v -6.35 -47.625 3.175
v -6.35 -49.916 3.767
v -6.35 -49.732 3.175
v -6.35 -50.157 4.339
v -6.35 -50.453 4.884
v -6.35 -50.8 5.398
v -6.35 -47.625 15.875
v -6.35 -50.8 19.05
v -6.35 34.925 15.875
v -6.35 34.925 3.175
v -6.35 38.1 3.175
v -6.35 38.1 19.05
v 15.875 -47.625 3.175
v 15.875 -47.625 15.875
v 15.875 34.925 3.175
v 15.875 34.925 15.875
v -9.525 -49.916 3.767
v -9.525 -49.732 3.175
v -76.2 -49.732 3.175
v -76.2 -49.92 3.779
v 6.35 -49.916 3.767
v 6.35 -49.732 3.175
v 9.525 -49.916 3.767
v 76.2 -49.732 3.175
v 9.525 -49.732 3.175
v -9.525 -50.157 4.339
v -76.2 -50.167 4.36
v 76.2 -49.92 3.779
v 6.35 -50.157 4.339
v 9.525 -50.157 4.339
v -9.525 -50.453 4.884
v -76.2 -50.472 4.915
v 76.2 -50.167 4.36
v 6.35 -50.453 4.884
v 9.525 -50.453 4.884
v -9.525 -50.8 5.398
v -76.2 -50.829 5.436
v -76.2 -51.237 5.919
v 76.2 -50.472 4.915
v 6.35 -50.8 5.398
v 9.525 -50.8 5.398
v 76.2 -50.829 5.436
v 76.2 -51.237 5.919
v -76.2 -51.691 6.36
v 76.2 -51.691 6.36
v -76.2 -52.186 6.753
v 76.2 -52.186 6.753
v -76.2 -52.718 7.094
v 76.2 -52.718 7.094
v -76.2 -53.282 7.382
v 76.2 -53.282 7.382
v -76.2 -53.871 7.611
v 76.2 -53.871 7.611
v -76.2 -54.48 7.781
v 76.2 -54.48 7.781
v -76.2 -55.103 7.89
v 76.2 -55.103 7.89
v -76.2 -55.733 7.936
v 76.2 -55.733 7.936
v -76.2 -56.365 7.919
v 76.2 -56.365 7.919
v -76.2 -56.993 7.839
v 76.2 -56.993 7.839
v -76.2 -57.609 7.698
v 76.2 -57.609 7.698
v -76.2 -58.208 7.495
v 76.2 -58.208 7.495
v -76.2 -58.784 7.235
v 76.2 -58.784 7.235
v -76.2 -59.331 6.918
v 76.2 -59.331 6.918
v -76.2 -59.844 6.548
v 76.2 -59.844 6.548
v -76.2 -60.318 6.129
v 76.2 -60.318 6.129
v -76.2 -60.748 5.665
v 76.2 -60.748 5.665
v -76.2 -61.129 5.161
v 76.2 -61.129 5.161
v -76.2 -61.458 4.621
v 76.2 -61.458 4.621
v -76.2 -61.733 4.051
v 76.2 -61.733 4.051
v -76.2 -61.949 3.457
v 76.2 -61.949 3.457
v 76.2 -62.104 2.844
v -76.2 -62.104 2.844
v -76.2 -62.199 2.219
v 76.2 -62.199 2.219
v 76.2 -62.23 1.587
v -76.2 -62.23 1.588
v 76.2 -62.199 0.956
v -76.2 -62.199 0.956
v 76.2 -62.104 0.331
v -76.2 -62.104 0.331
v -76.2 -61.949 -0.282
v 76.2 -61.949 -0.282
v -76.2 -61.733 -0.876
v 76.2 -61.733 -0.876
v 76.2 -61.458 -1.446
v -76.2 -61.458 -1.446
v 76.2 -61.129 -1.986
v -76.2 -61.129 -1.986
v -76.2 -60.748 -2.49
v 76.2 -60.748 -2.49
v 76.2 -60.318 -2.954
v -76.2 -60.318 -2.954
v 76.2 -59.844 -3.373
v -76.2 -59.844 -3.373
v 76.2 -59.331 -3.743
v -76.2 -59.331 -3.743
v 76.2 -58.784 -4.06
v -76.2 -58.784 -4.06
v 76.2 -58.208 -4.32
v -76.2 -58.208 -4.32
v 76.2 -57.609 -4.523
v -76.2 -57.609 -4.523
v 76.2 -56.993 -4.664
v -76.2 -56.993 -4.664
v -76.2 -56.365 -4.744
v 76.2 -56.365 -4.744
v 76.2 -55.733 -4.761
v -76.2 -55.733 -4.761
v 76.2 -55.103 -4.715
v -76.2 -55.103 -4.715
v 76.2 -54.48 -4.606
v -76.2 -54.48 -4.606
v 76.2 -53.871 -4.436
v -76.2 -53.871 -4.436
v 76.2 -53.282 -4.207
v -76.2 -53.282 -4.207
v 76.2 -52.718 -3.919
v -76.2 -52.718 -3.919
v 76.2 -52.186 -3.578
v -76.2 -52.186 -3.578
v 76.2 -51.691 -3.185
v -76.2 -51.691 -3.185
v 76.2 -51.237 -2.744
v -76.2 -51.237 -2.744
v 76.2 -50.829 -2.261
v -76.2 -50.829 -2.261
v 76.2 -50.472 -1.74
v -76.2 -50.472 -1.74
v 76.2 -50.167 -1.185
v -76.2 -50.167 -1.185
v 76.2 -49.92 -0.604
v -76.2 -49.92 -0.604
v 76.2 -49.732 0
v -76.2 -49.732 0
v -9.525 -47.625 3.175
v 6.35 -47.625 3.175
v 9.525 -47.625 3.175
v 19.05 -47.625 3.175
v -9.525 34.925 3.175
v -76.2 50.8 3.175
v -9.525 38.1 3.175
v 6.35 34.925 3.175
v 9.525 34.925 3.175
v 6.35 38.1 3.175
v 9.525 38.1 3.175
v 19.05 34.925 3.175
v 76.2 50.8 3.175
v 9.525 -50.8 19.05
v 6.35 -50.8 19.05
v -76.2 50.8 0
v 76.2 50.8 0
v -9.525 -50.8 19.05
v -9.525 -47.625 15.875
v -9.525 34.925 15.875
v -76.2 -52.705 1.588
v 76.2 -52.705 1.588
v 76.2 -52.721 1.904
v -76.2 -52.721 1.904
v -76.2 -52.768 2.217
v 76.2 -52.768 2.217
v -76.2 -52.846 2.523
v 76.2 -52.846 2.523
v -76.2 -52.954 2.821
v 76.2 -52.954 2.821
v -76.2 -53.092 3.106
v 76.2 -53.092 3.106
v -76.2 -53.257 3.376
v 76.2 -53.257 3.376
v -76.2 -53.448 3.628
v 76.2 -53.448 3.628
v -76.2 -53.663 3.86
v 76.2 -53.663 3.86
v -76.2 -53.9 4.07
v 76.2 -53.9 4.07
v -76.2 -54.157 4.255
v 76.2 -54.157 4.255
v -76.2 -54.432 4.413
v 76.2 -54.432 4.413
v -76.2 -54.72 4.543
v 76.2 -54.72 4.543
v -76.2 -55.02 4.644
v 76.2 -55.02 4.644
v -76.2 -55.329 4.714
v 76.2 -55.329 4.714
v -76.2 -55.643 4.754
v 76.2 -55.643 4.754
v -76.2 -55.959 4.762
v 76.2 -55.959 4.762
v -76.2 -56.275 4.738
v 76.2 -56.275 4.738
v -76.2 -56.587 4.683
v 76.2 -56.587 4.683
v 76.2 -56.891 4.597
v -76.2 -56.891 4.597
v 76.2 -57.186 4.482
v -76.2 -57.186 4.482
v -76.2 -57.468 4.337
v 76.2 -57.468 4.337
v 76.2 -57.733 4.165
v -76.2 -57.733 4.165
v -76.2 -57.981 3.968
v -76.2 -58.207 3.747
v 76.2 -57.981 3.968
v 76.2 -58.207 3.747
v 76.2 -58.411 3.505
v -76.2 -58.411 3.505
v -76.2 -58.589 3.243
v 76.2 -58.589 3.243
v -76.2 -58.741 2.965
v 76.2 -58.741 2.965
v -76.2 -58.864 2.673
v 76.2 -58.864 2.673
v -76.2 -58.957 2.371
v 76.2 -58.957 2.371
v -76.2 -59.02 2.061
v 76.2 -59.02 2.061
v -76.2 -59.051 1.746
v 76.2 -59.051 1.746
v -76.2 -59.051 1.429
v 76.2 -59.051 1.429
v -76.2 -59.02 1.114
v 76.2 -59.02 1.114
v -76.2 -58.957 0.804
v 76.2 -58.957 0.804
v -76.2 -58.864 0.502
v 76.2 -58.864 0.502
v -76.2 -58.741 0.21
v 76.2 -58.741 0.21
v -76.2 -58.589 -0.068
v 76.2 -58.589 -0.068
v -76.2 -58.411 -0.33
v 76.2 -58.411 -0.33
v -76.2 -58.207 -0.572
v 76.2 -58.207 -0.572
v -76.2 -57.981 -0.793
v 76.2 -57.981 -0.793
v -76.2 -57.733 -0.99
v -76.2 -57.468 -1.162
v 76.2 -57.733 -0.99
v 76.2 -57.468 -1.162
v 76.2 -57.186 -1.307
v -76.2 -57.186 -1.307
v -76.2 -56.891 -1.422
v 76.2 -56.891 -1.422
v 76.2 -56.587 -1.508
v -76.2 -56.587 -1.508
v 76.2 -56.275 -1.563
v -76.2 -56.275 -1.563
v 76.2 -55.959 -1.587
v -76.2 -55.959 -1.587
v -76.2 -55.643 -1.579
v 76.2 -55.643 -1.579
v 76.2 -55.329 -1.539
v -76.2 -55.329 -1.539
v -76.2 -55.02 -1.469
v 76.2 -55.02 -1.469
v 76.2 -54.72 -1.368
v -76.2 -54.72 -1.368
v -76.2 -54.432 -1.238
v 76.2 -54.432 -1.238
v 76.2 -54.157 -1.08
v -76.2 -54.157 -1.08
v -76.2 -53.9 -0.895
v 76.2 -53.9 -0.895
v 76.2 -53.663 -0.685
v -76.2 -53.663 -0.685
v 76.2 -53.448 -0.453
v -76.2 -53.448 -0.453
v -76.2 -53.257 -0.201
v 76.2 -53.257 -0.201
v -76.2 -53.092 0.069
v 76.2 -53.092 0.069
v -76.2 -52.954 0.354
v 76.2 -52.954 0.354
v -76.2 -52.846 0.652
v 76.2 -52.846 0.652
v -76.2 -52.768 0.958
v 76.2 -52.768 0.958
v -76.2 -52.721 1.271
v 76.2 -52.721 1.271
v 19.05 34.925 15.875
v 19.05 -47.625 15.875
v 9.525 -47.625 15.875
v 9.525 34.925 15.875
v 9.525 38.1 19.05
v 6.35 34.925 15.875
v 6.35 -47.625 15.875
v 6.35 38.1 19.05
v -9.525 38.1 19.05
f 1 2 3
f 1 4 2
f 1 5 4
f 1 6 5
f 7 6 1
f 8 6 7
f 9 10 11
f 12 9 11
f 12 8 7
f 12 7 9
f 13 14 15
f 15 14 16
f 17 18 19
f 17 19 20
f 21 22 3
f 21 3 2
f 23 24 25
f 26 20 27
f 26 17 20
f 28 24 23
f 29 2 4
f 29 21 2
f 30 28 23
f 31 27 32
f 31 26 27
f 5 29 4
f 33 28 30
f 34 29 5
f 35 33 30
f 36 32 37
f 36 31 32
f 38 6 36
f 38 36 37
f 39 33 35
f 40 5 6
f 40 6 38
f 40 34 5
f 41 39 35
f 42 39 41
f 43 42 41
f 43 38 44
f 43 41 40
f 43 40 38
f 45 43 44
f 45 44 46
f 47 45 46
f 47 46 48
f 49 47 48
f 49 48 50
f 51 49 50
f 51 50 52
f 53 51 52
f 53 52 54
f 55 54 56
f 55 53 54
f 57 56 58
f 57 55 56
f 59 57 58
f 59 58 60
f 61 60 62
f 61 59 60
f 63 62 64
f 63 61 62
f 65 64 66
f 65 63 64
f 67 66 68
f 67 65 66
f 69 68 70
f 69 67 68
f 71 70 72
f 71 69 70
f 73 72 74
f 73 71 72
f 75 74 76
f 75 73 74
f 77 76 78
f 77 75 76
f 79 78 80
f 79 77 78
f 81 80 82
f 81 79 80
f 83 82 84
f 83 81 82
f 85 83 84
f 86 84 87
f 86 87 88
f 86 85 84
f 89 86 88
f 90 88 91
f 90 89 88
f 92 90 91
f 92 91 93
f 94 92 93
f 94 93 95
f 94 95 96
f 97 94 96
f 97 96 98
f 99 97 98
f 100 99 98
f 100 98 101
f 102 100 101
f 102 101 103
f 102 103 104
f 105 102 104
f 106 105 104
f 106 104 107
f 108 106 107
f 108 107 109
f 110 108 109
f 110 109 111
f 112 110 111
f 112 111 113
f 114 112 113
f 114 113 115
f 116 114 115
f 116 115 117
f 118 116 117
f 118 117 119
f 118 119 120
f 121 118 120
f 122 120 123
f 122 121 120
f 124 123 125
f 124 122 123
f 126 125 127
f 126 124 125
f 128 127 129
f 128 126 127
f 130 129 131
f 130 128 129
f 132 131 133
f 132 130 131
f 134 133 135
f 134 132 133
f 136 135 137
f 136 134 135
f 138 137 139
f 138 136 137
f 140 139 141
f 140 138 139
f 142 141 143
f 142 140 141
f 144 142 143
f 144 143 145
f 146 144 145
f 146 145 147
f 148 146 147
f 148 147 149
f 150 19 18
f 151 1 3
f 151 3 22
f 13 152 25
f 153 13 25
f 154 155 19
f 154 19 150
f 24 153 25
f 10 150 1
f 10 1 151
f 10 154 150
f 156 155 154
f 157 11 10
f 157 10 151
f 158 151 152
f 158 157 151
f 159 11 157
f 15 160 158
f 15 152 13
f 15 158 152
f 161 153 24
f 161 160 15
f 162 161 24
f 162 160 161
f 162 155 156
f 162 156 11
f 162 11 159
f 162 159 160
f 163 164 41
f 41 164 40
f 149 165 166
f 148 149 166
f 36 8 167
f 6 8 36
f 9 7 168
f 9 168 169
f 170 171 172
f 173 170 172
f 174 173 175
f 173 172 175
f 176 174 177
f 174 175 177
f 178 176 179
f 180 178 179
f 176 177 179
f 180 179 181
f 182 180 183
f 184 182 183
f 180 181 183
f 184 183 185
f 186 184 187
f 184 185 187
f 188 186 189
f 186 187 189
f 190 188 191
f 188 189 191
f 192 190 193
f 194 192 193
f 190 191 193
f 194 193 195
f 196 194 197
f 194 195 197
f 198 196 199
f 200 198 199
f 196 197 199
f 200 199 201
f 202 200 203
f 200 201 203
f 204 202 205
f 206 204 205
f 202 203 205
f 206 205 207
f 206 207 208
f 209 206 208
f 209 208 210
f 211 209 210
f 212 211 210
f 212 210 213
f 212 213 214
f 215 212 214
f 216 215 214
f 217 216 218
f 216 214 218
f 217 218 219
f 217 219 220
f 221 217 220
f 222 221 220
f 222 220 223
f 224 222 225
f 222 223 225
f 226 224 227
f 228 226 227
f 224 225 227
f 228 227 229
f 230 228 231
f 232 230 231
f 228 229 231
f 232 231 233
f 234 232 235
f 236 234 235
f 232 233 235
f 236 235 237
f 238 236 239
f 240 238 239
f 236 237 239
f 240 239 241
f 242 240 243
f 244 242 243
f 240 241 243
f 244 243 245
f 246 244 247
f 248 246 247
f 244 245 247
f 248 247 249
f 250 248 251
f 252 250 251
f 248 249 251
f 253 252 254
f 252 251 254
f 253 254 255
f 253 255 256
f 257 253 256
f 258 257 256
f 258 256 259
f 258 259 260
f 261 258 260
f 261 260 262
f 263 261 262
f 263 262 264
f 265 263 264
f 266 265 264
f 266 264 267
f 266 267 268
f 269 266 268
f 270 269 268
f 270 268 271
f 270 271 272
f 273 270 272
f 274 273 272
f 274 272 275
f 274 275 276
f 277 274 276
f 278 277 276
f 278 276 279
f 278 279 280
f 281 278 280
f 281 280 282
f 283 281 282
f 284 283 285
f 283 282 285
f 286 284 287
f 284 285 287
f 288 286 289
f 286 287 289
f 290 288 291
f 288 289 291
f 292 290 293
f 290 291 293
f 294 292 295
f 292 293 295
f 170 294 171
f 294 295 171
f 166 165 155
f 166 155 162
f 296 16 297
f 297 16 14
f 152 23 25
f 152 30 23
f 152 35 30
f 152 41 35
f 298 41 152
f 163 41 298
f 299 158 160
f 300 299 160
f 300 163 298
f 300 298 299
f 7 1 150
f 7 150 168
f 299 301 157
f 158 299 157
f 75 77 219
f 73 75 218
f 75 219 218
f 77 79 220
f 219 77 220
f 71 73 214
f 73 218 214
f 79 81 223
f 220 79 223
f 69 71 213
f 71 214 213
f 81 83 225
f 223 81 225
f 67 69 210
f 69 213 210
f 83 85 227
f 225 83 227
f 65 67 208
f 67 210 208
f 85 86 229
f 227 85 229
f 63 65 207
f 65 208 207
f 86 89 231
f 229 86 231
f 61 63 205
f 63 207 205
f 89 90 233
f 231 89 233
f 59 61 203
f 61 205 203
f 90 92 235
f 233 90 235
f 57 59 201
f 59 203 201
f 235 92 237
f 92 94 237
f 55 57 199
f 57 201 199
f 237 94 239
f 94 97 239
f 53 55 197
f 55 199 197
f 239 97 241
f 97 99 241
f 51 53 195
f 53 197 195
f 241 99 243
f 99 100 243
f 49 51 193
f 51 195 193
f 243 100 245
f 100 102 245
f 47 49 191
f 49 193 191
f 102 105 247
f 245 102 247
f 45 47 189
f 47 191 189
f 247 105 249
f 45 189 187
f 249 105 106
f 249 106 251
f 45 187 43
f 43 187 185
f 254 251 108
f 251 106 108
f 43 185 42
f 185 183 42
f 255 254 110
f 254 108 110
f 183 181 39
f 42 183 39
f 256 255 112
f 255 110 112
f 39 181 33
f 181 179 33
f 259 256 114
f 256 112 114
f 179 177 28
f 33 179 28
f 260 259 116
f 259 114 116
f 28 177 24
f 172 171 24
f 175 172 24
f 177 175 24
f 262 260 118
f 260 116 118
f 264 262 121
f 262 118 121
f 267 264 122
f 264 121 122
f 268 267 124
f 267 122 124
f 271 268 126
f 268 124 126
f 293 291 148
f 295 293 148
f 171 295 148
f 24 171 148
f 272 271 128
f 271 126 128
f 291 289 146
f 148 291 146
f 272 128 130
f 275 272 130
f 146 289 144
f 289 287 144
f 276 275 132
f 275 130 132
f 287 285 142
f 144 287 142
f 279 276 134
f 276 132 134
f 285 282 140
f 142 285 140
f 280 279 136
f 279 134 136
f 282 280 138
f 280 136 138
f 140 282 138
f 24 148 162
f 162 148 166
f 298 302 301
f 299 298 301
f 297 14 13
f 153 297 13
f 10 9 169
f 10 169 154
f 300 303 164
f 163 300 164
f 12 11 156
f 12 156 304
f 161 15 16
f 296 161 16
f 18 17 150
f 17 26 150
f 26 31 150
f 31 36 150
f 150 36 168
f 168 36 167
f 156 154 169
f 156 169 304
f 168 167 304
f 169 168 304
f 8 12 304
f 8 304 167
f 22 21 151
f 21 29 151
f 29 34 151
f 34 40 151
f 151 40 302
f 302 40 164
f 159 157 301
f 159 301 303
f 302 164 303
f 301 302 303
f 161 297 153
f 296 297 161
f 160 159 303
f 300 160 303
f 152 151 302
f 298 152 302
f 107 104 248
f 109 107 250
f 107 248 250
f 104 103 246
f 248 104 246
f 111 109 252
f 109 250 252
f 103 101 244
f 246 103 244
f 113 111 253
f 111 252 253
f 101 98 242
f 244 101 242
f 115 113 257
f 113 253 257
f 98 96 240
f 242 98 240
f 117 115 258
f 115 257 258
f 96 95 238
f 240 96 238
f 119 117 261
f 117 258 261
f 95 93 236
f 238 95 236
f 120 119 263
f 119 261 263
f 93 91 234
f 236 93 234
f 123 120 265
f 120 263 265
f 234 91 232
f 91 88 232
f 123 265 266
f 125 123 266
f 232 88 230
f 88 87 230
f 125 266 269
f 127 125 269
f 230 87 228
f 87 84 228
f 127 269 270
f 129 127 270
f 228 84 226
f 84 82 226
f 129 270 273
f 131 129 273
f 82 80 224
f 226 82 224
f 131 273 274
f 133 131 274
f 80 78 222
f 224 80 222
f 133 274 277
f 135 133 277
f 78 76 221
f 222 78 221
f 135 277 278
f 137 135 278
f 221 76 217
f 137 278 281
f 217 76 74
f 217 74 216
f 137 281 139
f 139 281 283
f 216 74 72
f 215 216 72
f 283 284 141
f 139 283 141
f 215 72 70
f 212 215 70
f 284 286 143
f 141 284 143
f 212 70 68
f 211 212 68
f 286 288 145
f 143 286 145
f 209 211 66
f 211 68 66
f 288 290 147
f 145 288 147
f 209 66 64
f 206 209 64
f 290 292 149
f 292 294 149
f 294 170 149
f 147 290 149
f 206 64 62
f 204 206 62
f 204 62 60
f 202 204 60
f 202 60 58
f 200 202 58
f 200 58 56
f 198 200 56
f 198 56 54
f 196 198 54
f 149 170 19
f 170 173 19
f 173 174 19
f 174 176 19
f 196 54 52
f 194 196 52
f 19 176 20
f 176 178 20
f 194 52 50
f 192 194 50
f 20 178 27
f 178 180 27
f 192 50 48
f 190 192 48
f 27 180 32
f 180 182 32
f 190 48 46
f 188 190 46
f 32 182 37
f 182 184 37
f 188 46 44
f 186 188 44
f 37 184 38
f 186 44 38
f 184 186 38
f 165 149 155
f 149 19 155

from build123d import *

# Parameters (mm, degrees)
F0_W      = 152.4
F0_H      = 101.6
F1_DEPTH  = 3.175
F2_R      = 6.35
F3_DEPTH  = 76.2
F4_DEPTH  = 76.2
F5_R      = 3.175
F6_DEPTH  = 152.4
F10_DEPTH = 3.175
F13_DEPTH = 3.175
F16_DEPTH = 3.175


# Not quite as in the source:
# - a feature names something its author has since deleted; it is built from what else it names


with BuildPart() as f1:
    # F0 (on Top) → F1 (new body)
    with BuildSketch(Plane.XY):
        Rectangle(F0_W, F0_H)
    extrude(amount=F1_DEPTH)

    # F2 (on Right) → F3 (join)
    with BuildSketch(Plane.YZ):
        with Locations((-55.88, 1.5875)):
            Circle(F2_R)
    extrude(amount=F3_DEPTH)

    # F4 (add): a face of the model
    f4_faces = [f1.faces().sort_by_distance(p)[0] for p in [
        (0, -56.0567159254, 1.5875),
    ]]
    extrude(f4_faces, amount=F4_DEPTH)

    # F5 (on face) → F6 (cut)
    with BuildSketch(Plane.YZ.offset(76.2)):
        with Locations((-55.88, 1.5875)):
            Circle(F5_R)
    extrude(amount=-F6_DEPTH, mode=Mode.SUBTRACT)

    # F9 (on offset) → F10 (join)
    with BuildSketch(Plane.YZ.offset(6.35)):
        Polygon((-50.8, 3.175), (-47.625, 3.175), (-47.625, 15.875), (34.925, 15.875), (34.925, 3.175), (38.1, 3.175), (38.1, 19.05), (-50.8, 19.05), align=None)
    extrude(amount=F10_DEPTH)

    # F12 (on offset) → F13 (join)
    with BuildSketch(Plane.YZ.offset(-6.35)):
        Polygon((-50.8, 3.175), (-47.625, 3.175), (-47.625, 15.875), (34.925, 15.875), (34.925, 3.175), (38.1, 3.175), (38.1, 19.05), (-50.8, 19.05), align=None)
    extrude(amount=-F13_DEPTH)

    # F15 (on offset) → F16 (join)
    with BuildSketch(Plane.YZ.offset(15.875)):
        Polygon((-47.625, 15.875), (-47.625, 3.175), (-47.3777212979, 3.175), (34.925, 3.175), (34.925, 15.875), align=None)
    extrude(amount=F16_DEPTH)


solid = f1.part
